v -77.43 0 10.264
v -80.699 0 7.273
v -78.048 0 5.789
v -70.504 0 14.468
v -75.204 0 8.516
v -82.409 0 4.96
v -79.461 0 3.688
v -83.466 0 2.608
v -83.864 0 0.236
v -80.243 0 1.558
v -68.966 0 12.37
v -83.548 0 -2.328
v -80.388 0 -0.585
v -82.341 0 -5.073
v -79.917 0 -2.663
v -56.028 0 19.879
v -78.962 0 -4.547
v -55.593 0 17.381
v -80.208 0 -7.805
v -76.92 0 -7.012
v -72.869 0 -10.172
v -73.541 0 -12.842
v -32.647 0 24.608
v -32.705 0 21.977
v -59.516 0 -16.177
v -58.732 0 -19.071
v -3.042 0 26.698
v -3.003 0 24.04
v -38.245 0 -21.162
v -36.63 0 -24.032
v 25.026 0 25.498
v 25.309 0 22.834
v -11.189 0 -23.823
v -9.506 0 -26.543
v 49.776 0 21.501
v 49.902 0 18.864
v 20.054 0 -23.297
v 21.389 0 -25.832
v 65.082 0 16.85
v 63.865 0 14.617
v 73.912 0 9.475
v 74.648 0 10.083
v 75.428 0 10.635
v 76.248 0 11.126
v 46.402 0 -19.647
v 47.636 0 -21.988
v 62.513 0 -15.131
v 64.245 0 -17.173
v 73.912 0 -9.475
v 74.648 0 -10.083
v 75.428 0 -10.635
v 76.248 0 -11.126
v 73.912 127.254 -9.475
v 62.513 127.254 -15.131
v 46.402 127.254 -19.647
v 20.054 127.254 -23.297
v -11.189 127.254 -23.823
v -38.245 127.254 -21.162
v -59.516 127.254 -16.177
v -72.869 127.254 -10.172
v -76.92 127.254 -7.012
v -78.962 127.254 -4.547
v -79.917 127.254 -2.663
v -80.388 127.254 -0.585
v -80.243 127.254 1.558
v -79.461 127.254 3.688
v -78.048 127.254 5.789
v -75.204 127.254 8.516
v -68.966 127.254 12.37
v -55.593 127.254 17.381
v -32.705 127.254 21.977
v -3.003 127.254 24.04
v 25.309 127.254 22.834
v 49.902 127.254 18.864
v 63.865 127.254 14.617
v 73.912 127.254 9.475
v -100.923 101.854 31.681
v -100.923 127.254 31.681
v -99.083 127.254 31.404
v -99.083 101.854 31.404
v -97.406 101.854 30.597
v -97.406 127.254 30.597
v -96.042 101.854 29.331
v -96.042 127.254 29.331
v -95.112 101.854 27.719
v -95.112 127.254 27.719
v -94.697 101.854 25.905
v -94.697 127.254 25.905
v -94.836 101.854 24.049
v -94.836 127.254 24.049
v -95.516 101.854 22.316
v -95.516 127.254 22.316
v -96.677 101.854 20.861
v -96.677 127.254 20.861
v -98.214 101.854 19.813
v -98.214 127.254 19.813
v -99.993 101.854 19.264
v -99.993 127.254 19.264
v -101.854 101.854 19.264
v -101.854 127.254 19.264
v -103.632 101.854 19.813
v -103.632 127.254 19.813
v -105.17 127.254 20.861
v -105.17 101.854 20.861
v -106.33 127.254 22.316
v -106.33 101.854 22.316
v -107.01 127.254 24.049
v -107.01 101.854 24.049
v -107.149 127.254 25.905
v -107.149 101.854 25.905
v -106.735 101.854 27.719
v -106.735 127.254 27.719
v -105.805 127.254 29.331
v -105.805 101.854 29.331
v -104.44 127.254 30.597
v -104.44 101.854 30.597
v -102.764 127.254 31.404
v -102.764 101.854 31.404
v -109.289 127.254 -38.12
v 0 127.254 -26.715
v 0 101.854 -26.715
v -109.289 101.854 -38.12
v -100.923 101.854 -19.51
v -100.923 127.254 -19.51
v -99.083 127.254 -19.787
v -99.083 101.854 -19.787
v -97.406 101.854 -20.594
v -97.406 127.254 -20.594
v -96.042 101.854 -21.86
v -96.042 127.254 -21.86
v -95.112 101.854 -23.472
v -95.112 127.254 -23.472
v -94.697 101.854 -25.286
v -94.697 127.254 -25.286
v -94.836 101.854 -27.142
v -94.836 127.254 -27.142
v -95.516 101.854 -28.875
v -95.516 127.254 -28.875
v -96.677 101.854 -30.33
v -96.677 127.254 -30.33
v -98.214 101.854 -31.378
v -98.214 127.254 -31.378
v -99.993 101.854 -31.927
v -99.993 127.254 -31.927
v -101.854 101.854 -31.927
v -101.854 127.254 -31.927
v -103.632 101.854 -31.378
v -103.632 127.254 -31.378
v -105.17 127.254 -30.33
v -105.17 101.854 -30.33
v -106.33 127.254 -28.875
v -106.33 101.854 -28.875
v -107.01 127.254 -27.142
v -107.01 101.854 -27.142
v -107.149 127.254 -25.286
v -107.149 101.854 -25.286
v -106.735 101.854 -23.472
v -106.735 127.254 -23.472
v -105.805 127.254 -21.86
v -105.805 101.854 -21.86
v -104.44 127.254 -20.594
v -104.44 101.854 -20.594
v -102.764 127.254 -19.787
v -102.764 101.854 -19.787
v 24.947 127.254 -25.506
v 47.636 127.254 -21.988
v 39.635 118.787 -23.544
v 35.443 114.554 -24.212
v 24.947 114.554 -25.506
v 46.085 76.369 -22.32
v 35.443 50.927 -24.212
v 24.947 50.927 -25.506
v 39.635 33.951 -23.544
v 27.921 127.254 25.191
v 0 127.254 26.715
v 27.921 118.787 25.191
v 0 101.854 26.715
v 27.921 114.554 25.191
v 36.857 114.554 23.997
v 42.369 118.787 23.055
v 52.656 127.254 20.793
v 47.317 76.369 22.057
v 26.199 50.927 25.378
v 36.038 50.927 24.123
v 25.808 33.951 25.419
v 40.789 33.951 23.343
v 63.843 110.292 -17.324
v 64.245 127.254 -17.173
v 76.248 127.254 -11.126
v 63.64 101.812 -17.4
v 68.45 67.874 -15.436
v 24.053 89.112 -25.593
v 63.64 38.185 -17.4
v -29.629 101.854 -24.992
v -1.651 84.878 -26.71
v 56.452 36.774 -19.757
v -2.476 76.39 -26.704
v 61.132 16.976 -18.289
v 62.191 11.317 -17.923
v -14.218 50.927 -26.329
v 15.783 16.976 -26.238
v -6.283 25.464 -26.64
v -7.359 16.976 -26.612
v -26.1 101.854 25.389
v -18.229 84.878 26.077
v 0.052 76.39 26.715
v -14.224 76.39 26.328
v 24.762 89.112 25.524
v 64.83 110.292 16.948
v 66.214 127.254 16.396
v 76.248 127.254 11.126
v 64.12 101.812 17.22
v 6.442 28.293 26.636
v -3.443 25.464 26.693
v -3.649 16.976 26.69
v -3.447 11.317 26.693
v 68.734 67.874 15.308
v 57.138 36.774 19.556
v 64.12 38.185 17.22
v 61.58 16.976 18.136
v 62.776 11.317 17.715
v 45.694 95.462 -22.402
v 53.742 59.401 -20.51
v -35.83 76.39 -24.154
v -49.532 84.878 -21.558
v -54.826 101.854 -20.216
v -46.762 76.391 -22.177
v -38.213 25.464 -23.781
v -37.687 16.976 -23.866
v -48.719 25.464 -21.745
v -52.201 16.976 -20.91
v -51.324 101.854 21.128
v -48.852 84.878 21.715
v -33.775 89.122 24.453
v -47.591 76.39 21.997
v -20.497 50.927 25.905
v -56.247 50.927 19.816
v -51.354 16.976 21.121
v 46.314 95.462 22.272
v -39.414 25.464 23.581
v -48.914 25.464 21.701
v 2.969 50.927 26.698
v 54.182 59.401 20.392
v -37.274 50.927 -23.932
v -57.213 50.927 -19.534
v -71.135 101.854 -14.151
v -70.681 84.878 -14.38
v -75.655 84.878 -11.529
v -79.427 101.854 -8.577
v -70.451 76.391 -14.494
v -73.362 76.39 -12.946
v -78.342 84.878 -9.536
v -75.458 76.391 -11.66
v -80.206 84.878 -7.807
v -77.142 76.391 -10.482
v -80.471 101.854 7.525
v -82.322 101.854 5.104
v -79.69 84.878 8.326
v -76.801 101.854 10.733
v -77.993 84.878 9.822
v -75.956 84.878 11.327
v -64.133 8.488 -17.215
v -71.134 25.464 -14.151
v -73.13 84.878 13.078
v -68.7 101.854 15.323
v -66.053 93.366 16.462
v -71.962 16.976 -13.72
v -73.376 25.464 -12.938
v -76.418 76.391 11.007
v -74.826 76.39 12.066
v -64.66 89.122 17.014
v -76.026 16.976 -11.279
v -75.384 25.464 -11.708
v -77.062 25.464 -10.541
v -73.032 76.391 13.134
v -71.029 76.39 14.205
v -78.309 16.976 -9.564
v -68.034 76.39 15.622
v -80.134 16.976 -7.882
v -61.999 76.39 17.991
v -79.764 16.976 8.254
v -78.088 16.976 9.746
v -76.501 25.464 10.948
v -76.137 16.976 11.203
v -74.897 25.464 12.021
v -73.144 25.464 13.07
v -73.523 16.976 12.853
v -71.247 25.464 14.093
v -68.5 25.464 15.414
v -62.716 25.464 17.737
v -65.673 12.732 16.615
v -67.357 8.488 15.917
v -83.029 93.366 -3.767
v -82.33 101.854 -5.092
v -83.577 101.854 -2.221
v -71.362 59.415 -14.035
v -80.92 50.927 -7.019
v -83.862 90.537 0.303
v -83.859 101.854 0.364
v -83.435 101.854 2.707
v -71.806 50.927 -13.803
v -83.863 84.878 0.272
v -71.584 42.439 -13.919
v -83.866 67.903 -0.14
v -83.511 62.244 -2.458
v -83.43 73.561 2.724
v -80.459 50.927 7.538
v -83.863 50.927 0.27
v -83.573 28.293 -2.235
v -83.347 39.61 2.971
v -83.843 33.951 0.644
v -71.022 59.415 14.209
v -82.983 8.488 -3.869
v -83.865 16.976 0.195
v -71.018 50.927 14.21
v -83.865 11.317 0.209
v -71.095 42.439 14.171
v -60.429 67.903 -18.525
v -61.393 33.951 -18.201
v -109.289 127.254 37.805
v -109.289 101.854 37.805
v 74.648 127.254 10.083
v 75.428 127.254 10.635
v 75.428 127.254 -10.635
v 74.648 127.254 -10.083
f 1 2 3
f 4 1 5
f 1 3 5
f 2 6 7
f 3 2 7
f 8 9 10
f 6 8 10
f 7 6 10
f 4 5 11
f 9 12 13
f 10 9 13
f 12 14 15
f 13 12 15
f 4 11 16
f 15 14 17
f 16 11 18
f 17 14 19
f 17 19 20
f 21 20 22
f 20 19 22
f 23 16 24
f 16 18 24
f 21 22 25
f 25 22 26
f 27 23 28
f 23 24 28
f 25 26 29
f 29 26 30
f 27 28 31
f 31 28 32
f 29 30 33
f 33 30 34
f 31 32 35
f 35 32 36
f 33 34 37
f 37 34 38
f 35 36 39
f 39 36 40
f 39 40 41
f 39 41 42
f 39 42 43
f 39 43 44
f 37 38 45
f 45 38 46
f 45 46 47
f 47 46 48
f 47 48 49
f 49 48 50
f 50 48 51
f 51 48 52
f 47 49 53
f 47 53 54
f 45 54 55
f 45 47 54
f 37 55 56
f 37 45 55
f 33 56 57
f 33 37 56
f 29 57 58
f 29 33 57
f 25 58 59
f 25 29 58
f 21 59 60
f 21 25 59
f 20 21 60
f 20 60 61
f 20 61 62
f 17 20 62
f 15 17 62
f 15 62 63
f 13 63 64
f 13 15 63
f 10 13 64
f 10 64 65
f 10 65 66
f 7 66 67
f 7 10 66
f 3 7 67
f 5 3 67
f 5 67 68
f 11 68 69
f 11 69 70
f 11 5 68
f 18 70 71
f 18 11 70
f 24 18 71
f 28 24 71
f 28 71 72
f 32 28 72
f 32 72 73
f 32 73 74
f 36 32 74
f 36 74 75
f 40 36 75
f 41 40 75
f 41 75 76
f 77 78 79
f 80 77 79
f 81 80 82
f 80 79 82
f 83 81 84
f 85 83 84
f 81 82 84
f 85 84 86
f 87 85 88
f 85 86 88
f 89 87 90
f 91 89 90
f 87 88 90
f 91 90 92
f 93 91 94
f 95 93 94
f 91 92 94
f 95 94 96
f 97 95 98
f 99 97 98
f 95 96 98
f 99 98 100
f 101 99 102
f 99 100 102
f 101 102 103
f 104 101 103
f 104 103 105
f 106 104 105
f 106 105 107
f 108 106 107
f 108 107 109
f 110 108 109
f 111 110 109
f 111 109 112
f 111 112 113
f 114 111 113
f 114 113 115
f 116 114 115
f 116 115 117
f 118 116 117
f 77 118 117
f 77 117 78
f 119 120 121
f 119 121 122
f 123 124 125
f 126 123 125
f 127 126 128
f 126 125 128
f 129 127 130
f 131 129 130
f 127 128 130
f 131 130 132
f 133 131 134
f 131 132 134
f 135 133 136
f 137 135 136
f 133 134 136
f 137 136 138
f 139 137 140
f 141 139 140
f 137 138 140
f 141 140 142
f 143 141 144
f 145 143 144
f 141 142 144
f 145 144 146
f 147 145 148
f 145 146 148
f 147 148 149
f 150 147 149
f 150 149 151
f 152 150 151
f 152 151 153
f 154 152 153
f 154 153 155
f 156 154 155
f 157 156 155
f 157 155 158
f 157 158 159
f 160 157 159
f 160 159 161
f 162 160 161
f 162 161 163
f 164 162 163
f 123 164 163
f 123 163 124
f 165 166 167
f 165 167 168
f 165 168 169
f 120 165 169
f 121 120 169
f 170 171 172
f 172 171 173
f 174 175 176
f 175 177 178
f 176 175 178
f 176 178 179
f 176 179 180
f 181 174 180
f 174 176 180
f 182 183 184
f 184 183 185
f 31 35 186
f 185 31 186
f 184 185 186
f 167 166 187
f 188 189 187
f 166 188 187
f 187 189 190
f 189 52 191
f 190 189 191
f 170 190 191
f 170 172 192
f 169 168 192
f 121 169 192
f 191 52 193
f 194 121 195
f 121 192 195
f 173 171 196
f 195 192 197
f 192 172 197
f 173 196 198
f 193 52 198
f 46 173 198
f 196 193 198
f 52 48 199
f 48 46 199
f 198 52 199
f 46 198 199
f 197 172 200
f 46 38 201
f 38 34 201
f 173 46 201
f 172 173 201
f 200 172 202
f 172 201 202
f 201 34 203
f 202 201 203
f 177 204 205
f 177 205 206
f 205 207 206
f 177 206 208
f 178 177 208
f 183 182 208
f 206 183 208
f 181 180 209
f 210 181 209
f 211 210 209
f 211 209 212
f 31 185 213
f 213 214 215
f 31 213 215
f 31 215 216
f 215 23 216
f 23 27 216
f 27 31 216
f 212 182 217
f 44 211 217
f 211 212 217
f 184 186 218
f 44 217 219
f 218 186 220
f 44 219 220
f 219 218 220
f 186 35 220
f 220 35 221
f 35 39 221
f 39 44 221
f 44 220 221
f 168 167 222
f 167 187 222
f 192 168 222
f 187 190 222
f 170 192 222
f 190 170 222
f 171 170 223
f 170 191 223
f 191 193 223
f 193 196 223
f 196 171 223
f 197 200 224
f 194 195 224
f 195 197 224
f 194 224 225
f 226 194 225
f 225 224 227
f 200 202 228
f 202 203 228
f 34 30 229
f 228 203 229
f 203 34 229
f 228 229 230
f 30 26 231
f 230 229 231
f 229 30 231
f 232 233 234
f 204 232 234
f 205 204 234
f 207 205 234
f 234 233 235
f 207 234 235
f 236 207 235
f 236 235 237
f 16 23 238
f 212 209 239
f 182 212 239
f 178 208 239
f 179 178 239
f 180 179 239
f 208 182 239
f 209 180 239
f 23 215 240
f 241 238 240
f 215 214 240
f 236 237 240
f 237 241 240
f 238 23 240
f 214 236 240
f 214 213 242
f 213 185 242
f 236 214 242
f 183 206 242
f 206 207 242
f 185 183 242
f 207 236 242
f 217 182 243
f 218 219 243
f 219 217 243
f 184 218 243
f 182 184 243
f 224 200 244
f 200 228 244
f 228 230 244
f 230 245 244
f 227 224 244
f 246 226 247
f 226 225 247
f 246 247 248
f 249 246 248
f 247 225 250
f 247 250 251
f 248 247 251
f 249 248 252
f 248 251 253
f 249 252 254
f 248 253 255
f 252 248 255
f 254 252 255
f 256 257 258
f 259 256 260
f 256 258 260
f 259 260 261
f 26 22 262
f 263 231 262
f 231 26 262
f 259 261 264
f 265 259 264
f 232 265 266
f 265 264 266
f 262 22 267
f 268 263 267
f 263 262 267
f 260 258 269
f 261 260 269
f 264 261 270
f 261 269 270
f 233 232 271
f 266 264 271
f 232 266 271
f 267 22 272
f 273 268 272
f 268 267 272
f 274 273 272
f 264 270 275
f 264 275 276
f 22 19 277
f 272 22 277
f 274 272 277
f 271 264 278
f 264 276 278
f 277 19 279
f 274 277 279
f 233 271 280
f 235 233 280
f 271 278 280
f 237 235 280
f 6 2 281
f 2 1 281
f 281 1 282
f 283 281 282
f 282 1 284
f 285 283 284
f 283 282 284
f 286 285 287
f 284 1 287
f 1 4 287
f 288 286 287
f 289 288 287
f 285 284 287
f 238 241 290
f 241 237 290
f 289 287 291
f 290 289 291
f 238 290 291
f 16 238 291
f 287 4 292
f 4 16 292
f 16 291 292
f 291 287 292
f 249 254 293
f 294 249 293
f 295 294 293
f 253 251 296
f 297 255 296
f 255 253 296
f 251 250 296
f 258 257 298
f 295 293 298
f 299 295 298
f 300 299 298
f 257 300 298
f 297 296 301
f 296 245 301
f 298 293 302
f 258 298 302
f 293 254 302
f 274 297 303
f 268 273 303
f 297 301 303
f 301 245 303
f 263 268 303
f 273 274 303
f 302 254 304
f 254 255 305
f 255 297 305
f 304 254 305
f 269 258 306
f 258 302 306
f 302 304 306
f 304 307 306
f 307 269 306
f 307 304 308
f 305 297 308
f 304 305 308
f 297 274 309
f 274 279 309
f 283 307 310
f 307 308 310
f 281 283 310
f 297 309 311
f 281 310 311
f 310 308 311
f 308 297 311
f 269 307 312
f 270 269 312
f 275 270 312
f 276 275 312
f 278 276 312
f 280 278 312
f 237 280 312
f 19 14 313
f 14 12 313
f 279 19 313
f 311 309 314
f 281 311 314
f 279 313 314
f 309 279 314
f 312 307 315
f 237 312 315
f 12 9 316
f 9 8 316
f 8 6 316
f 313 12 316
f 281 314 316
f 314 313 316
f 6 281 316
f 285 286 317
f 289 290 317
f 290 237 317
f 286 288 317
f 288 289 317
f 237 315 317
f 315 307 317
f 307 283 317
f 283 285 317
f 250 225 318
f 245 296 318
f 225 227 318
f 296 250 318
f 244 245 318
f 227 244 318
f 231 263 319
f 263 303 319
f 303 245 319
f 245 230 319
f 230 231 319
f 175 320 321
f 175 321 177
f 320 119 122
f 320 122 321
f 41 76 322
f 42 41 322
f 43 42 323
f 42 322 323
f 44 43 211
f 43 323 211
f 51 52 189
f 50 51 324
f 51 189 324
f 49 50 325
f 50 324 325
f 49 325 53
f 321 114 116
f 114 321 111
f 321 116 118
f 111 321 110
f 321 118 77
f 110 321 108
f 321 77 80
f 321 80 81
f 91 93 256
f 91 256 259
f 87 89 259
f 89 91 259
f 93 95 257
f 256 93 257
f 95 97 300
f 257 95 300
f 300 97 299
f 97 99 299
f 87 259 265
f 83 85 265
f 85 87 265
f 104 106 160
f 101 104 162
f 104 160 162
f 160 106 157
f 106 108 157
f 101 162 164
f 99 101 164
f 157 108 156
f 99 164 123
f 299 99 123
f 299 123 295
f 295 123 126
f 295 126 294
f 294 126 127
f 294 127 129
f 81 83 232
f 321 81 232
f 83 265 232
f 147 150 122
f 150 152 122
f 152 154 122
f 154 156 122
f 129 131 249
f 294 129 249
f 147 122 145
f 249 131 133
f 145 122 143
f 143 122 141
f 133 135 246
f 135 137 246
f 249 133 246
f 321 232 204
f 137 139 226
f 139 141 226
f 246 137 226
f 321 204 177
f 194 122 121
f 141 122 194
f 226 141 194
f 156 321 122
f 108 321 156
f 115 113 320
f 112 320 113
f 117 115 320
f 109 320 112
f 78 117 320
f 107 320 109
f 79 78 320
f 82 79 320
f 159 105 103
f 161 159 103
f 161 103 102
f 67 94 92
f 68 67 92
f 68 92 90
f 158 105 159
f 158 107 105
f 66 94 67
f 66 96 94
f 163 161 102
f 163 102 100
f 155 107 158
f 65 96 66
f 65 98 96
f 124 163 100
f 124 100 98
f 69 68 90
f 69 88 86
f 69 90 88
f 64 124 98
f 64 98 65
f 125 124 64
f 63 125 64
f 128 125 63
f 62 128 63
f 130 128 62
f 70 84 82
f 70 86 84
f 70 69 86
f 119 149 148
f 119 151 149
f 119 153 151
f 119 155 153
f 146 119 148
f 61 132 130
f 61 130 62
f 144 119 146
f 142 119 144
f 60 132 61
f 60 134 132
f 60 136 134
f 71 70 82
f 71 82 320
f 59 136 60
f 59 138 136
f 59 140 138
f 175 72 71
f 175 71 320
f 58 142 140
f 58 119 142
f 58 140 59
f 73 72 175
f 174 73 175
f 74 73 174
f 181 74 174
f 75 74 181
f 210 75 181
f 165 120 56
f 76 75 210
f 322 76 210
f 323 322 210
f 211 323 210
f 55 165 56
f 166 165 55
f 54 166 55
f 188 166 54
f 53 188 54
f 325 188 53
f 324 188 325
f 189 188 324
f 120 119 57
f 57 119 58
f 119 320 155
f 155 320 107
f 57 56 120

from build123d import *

# Parameters (mm, degrees)
SKETCH1_RX          = 83.867123974
SKETCH1_RY          = 26.715201139
SKETCH1_RX_2        = 80.411426315
SKETCH1_RY_2        = 24.05697217
BOSS_EXTRUDE1_DEPTH = 127.254
SKETCH2_R           = 12.695879526
CUT_EXTRUDE1_DEPTH  = 157.48
BOSS_EXTRUDE2_DEPTH = 25.4
SKETCH5_R           = 6.243439839
CUT_EXTRUDE2_DEPTH  = 148.336


with BuildPart() as part:
    # Sketch1 → Boss-Extrude1 (new body)
    with BuildSketch(Plane(origin=(0, 0, 0), x_dir=(1, 0, 0), z_dir=(0, 1, 0))):
        with Locations((0, 0)):
            Ellipse(SKETCH1_RX, SKETCH1_RY)
        with Locations((0, 0)):
            Ellipse(SKETCH1_RX_2, SKETCH1_RY_2, mode=Mode.SUBTRACT)
    extrude(amount=BOSS_EXTRUDE1_DEPTH)

    # Sketch2 → Cut-Extrude1 (cut)
    with BuildSketch(Plane(origin=(0, 127.254, 0), x_dir=(1, 0, 0), z_dir=(0, 1, 0))):
        with Locations((82.362769104, 0)):
            Circle(SKETCH2_R)
    extrude(amount=-CUT_EXTRUDE1_DEPTH, mode=Mode.SUBTRACT)

    # Sketch4 → Boss-Extrude2 (add)
    with BuildSketch(Plane(origin=(0, 127.254, 0), x_dir=(1, 0, 0), z_dir=(0, 1, 0))):
        with BuildLine():
            Line((-109.288782468, 26.715201139), (-109.288782468, -26.715201139))
            Line((-109.288782468, -26.715201139), (-109.288782468, -37.805360258))
            Line((-109.288782468, -37.805360258), (0, -26.715201139))
            add(Edge.make_bspline(
                [(0, 26.715201139), (-83.867123974, 26.715201139), (-83.867123974, 0), (-83.867123974, -26.715201139), (0, -26.715201139)],
                knots=[1.570796327, 1.570796327, 1.570796327, 3.141592654, 3.141592654, 4.71238898, 4.71238898, 4.71238898], degree=2, weights=[1, 0.707106781, 1, 0.707106781, 1]))
            Line((0, 26.715201139), (-109.288782468, 38.120339295))
            Line((-109.288782468, 38.120339295), (-109.288782468, 26.715201139))
        make_face()
    extrude(amount=-BOSS_EXTRUDE2_DEPTH)

    # Sketch5 → Cut-Extrude2 (cut)
    with BuildSketch(Plane(origin=(0, 127.254, 0), x_dir=(1, 0, 0), z_dir=(0, 1, 0))):
        with Locations(Location((-100.92336604, 25.752966871, 0), (0, 0, 270))):
            Circle(SKETCH5_R)
        with Locations(Location((-100.92336604, -25.437987834, 0), (0, 0, 270))):
            Circle(SKETCH5_R)
    extrude(amount=-CUT_EXTRUDE2_DEPTH, mode=Mode.SUBTRACT)


solid = part.part
